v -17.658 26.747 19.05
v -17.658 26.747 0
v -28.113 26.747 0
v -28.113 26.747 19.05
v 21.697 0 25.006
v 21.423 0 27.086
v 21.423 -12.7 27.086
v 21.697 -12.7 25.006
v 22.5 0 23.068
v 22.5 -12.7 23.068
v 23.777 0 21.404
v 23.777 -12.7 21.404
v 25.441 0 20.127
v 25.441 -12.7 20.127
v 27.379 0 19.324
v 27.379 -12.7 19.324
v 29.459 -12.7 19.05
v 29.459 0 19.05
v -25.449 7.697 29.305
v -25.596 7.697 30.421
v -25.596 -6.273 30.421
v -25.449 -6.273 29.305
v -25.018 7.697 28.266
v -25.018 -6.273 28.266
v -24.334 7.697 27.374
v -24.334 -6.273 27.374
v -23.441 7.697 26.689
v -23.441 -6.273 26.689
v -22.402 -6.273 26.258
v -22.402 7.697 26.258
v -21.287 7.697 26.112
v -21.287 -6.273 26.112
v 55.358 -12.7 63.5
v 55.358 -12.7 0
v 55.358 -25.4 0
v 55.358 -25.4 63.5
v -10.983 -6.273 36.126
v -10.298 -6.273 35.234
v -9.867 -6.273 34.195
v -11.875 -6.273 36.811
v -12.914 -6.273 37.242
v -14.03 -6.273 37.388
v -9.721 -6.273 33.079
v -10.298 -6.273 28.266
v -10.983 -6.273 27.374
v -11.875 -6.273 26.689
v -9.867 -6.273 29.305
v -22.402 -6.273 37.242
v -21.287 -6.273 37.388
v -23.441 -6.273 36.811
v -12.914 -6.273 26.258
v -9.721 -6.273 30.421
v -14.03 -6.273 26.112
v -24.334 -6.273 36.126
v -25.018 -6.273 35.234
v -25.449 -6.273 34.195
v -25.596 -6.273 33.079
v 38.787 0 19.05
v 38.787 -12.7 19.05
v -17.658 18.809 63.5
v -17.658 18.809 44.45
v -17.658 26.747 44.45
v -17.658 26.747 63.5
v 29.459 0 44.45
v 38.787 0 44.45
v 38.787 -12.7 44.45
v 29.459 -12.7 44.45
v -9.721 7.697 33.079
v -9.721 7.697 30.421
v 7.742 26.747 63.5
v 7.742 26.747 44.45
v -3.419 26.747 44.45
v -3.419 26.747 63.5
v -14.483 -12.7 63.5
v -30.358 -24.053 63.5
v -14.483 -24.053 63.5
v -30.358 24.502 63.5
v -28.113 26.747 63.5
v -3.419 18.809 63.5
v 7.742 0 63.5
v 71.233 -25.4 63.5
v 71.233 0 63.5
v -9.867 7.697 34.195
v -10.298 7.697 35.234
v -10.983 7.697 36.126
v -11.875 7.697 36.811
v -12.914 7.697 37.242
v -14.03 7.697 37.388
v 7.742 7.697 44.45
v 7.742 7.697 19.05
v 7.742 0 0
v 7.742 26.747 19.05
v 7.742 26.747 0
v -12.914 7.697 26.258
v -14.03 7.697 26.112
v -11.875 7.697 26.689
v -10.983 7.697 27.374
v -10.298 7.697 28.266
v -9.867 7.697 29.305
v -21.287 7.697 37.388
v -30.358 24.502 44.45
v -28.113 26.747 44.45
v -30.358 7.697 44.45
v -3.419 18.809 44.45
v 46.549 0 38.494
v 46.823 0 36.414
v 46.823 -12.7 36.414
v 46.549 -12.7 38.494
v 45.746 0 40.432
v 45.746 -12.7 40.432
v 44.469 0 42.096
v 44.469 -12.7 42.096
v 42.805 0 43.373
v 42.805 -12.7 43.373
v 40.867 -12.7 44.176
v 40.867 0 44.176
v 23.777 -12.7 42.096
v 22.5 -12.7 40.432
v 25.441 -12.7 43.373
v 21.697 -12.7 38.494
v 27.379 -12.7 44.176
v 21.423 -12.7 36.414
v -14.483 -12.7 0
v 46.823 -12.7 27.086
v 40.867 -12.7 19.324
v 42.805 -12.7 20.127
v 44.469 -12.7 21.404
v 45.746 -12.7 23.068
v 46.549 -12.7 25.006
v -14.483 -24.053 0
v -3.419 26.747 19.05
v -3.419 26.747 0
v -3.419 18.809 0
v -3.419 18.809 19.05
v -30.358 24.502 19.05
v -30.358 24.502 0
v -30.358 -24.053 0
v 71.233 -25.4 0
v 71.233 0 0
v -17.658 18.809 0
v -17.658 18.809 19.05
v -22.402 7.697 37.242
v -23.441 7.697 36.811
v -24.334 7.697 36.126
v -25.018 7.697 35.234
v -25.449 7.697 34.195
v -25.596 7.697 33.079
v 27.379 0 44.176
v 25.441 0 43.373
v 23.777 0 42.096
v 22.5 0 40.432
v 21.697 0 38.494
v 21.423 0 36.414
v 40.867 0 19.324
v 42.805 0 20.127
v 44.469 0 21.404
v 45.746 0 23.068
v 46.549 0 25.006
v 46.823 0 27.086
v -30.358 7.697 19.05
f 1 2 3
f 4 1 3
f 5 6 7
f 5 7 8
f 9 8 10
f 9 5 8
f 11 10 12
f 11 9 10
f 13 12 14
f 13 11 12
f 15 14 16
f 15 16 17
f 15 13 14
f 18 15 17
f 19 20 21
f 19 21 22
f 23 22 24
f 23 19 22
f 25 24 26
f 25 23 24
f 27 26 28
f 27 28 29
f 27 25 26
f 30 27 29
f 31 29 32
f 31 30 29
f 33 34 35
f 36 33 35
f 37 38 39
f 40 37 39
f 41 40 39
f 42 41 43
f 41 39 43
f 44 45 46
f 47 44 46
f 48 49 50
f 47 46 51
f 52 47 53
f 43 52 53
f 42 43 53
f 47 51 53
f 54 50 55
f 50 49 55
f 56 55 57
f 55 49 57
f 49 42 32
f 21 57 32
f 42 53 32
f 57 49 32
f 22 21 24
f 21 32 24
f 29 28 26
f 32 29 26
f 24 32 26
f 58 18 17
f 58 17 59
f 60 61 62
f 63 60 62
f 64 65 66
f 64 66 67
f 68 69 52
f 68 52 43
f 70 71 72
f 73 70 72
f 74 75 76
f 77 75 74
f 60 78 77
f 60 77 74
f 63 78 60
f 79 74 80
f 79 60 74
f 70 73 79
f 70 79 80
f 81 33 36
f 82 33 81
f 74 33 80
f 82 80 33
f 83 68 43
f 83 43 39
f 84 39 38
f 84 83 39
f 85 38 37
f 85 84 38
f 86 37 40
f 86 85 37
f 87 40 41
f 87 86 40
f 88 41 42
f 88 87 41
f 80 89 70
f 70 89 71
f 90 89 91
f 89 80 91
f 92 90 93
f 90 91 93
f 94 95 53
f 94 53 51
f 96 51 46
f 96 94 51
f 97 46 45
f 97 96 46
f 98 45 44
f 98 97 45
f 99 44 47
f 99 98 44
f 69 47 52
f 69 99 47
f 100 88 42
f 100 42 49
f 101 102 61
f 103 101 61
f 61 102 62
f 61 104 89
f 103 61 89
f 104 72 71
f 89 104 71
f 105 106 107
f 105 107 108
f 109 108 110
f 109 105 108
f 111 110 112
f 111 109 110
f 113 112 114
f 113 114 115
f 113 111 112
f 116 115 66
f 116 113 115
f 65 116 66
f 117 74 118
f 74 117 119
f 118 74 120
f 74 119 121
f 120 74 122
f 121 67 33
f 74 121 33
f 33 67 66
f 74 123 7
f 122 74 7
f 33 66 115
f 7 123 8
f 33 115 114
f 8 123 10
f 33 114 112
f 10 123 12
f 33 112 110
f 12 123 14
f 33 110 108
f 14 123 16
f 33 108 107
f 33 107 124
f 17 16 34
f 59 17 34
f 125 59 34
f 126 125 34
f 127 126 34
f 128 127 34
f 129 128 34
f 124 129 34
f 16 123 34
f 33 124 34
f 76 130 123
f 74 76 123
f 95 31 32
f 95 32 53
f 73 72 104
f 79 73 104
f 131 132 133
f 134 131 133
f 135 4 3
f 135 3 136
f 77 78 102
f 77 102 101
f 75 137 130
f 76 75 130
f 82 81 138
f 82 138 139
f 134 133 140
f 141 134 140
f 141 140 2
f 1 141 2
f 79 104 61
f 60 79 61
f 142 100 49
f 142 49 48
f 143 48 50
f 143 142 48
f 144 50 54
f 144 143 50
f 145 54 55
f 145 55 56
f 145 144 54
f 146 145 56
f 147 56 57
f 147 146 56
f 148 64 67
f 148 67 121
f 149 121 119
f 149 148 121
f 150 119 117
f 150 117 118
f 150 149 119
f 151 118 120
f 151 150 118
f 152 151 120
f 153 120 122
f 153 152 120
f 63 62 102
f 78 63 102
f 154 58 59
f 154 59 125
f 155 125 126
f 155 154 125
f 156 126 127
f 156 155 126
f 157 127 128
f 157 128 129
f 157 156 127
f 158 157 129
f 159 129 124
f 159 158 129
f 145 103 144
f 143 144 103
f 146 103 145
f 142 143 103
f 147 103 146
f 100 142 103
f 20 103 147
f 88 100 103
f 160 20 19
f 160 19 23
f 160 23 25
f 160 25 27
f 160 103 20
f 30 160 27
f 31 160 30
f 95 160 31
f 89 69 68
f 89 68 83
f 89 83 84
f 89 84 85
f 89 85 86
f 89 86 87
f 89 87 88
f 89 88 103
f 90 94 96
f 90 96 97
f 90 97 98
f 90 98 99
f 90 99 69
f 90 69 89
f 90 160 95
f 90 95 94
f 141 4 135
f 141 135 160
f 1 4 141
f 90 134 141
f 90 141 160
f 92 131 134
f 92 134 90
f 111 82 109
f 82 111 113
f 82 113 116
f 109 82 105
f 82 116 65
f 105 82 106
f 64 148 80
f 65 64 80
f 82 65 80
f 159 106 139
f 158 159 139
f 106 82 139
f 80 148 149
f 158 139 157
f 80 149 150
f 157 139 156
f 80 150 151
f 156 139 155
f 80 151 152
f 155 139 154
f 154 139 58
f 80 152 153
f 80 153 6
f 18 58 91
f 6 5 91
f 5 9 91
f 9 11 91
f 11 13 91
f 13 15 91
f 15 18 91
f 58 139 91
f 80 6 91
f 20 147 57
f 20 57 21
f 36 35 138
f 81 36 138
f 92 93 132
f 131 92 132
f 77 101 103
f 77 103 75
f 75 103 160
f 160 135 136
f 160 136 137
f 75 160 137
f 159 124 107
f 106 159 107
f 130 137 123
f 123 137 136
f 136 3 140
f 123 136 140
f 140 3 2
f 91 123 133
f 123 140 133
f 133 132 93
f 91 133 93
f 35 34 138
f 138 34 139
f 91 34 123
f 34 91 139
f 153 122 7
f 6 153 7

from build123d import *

# Parameters (mm, degrees)
BOSS_EXTRUDE1_DEPTH = 63.5
SKETCH5_W           = 38.1
SKETCH5_H           = 25.4
CUT_EXTRUDE1_DEPTH  = 19.05
CUT_EXTRUDE2_DEPTH  = 12.7
CUT_EXTRUDE3_DEPTH  = 13.97


with BuildPart() as part:
    # Sketch1 → Boss-Extrude1 (new body)
    with BuildSketch(Plane.XY):
        Polygon((-30.358125429, 24.501905667), (-30.358125429, -24.053030303), (-14.483125429, -24.053030303), (-14.483125429, -12.7), (55.357945402, -12.7), (55.357945402, -25.4), (71.232945402, -25.4), (71.232945402, 0), (7.741874571, 0), (7.741874571, 26.746969697), (-3.41873149, 26.746969697), (-3.41873149, 18.809469697), (-17.658125429, 18.809469697), (-17.658125429, 26.746969697), (-28.113061399, 26.746969697), align=None)
    extrude(amount=BOSS_EXTRUDE1_DEPTH)

    # Sketch5 → Cut-Extrude1 (cut)
    with BuildSketch(Plane(origin=(0, 26.746969697, 0), x_dir=(1, 0, 0), z_dir=(0, 1, 0))):
        with Locations((-11.308125429, -31.75)):
            Rectangle(SKETCH5_W, SKETCH5_H)
    extrude(amount=-CUT_EXTRUDE1_DEPTH, mode=Mode.SUBTRACT)

    # Sketch6 → Cut-Extrude2 (cut)
    with BuildSketch(Plane(origin=(0, 0, 0), x_dir=(1, 0, 0), z_dir=(0, 1, 0))):
        with BuildLine():
            Line((29.459066372, -19.05), (38.786778405, -19.05))
            ThreePointArc((38.786778405, -19.05), (44.46919031, -21.403732078), (46.822922388, -27.086143983))
            Line((46.822922388, -27.086143983), (46.822922388, -36.413856017))
            ThreePointArc((46.822922388, -36.413856017), (44.46919031, -42.096267922), (38.786778405, -44.45))
            Line((38.786778405, -44.45), (29.459066372, -44.45))
            ThreePointArc((29.459066372, -44.45), (23.776654467, -42.096267922), (21.422922388, -36.413856017))
            Line((21.422922388, -36.413856017), (21.422922388, -27.086143983))
            ThreePointArc((21.422922388, -27.086143983), (23.776654467, -21.403732078), (29.459066372, -19.05))
        make_face()
    extrude(amount=-CUT_EXTRUDE2_DEPTH, mode=Mode.SUBTRACT)

    # Sketch7 → Cut-Extrude3 (cut)
    with BuildSketch(Plane(origin=(0, 7.696969697, 0), x_dir=(1, 0, 0), z_dir=(0, 1, 0))):
        with BuildLine():
            Line((-21.28655142, -26.111602122), (-14.029699438, -26.111602122))
            ThreePointArc((-14.029699438, -26.111602122), (-10.982723986, -27.373700678), (-9.720625429, -30.420676131))
            Line((-9.720625429, -30.420676131), (-9.720625429, -33.079323869))
            ThreePointArc((-9.720625429, -33.079323869), (-10.982723986, -36.126299322), (-14.029699438, -37.388397878))
            Line((-14.029699438, -37.388397878), (-21.28655142, -37.388397878))
            ThreePointArc((-21.28655142, -37.388397878), (-24.333526873, -36.126299322), (-25.595625429, -33.079323869))
            Line((-25.595625429, -33.079323869), (-25.595625429, -30.420676131))
            ThreePointArc((-25.595625429, -30.420676131), (-24.333526873, -27.373700678), (-21.28655142, -26.111602122))
        make_face()
    extrude(amount=-CUT_EXTRUDE3_DEPTH, mode=Mode.SUBTRACT)


solid = part.part
